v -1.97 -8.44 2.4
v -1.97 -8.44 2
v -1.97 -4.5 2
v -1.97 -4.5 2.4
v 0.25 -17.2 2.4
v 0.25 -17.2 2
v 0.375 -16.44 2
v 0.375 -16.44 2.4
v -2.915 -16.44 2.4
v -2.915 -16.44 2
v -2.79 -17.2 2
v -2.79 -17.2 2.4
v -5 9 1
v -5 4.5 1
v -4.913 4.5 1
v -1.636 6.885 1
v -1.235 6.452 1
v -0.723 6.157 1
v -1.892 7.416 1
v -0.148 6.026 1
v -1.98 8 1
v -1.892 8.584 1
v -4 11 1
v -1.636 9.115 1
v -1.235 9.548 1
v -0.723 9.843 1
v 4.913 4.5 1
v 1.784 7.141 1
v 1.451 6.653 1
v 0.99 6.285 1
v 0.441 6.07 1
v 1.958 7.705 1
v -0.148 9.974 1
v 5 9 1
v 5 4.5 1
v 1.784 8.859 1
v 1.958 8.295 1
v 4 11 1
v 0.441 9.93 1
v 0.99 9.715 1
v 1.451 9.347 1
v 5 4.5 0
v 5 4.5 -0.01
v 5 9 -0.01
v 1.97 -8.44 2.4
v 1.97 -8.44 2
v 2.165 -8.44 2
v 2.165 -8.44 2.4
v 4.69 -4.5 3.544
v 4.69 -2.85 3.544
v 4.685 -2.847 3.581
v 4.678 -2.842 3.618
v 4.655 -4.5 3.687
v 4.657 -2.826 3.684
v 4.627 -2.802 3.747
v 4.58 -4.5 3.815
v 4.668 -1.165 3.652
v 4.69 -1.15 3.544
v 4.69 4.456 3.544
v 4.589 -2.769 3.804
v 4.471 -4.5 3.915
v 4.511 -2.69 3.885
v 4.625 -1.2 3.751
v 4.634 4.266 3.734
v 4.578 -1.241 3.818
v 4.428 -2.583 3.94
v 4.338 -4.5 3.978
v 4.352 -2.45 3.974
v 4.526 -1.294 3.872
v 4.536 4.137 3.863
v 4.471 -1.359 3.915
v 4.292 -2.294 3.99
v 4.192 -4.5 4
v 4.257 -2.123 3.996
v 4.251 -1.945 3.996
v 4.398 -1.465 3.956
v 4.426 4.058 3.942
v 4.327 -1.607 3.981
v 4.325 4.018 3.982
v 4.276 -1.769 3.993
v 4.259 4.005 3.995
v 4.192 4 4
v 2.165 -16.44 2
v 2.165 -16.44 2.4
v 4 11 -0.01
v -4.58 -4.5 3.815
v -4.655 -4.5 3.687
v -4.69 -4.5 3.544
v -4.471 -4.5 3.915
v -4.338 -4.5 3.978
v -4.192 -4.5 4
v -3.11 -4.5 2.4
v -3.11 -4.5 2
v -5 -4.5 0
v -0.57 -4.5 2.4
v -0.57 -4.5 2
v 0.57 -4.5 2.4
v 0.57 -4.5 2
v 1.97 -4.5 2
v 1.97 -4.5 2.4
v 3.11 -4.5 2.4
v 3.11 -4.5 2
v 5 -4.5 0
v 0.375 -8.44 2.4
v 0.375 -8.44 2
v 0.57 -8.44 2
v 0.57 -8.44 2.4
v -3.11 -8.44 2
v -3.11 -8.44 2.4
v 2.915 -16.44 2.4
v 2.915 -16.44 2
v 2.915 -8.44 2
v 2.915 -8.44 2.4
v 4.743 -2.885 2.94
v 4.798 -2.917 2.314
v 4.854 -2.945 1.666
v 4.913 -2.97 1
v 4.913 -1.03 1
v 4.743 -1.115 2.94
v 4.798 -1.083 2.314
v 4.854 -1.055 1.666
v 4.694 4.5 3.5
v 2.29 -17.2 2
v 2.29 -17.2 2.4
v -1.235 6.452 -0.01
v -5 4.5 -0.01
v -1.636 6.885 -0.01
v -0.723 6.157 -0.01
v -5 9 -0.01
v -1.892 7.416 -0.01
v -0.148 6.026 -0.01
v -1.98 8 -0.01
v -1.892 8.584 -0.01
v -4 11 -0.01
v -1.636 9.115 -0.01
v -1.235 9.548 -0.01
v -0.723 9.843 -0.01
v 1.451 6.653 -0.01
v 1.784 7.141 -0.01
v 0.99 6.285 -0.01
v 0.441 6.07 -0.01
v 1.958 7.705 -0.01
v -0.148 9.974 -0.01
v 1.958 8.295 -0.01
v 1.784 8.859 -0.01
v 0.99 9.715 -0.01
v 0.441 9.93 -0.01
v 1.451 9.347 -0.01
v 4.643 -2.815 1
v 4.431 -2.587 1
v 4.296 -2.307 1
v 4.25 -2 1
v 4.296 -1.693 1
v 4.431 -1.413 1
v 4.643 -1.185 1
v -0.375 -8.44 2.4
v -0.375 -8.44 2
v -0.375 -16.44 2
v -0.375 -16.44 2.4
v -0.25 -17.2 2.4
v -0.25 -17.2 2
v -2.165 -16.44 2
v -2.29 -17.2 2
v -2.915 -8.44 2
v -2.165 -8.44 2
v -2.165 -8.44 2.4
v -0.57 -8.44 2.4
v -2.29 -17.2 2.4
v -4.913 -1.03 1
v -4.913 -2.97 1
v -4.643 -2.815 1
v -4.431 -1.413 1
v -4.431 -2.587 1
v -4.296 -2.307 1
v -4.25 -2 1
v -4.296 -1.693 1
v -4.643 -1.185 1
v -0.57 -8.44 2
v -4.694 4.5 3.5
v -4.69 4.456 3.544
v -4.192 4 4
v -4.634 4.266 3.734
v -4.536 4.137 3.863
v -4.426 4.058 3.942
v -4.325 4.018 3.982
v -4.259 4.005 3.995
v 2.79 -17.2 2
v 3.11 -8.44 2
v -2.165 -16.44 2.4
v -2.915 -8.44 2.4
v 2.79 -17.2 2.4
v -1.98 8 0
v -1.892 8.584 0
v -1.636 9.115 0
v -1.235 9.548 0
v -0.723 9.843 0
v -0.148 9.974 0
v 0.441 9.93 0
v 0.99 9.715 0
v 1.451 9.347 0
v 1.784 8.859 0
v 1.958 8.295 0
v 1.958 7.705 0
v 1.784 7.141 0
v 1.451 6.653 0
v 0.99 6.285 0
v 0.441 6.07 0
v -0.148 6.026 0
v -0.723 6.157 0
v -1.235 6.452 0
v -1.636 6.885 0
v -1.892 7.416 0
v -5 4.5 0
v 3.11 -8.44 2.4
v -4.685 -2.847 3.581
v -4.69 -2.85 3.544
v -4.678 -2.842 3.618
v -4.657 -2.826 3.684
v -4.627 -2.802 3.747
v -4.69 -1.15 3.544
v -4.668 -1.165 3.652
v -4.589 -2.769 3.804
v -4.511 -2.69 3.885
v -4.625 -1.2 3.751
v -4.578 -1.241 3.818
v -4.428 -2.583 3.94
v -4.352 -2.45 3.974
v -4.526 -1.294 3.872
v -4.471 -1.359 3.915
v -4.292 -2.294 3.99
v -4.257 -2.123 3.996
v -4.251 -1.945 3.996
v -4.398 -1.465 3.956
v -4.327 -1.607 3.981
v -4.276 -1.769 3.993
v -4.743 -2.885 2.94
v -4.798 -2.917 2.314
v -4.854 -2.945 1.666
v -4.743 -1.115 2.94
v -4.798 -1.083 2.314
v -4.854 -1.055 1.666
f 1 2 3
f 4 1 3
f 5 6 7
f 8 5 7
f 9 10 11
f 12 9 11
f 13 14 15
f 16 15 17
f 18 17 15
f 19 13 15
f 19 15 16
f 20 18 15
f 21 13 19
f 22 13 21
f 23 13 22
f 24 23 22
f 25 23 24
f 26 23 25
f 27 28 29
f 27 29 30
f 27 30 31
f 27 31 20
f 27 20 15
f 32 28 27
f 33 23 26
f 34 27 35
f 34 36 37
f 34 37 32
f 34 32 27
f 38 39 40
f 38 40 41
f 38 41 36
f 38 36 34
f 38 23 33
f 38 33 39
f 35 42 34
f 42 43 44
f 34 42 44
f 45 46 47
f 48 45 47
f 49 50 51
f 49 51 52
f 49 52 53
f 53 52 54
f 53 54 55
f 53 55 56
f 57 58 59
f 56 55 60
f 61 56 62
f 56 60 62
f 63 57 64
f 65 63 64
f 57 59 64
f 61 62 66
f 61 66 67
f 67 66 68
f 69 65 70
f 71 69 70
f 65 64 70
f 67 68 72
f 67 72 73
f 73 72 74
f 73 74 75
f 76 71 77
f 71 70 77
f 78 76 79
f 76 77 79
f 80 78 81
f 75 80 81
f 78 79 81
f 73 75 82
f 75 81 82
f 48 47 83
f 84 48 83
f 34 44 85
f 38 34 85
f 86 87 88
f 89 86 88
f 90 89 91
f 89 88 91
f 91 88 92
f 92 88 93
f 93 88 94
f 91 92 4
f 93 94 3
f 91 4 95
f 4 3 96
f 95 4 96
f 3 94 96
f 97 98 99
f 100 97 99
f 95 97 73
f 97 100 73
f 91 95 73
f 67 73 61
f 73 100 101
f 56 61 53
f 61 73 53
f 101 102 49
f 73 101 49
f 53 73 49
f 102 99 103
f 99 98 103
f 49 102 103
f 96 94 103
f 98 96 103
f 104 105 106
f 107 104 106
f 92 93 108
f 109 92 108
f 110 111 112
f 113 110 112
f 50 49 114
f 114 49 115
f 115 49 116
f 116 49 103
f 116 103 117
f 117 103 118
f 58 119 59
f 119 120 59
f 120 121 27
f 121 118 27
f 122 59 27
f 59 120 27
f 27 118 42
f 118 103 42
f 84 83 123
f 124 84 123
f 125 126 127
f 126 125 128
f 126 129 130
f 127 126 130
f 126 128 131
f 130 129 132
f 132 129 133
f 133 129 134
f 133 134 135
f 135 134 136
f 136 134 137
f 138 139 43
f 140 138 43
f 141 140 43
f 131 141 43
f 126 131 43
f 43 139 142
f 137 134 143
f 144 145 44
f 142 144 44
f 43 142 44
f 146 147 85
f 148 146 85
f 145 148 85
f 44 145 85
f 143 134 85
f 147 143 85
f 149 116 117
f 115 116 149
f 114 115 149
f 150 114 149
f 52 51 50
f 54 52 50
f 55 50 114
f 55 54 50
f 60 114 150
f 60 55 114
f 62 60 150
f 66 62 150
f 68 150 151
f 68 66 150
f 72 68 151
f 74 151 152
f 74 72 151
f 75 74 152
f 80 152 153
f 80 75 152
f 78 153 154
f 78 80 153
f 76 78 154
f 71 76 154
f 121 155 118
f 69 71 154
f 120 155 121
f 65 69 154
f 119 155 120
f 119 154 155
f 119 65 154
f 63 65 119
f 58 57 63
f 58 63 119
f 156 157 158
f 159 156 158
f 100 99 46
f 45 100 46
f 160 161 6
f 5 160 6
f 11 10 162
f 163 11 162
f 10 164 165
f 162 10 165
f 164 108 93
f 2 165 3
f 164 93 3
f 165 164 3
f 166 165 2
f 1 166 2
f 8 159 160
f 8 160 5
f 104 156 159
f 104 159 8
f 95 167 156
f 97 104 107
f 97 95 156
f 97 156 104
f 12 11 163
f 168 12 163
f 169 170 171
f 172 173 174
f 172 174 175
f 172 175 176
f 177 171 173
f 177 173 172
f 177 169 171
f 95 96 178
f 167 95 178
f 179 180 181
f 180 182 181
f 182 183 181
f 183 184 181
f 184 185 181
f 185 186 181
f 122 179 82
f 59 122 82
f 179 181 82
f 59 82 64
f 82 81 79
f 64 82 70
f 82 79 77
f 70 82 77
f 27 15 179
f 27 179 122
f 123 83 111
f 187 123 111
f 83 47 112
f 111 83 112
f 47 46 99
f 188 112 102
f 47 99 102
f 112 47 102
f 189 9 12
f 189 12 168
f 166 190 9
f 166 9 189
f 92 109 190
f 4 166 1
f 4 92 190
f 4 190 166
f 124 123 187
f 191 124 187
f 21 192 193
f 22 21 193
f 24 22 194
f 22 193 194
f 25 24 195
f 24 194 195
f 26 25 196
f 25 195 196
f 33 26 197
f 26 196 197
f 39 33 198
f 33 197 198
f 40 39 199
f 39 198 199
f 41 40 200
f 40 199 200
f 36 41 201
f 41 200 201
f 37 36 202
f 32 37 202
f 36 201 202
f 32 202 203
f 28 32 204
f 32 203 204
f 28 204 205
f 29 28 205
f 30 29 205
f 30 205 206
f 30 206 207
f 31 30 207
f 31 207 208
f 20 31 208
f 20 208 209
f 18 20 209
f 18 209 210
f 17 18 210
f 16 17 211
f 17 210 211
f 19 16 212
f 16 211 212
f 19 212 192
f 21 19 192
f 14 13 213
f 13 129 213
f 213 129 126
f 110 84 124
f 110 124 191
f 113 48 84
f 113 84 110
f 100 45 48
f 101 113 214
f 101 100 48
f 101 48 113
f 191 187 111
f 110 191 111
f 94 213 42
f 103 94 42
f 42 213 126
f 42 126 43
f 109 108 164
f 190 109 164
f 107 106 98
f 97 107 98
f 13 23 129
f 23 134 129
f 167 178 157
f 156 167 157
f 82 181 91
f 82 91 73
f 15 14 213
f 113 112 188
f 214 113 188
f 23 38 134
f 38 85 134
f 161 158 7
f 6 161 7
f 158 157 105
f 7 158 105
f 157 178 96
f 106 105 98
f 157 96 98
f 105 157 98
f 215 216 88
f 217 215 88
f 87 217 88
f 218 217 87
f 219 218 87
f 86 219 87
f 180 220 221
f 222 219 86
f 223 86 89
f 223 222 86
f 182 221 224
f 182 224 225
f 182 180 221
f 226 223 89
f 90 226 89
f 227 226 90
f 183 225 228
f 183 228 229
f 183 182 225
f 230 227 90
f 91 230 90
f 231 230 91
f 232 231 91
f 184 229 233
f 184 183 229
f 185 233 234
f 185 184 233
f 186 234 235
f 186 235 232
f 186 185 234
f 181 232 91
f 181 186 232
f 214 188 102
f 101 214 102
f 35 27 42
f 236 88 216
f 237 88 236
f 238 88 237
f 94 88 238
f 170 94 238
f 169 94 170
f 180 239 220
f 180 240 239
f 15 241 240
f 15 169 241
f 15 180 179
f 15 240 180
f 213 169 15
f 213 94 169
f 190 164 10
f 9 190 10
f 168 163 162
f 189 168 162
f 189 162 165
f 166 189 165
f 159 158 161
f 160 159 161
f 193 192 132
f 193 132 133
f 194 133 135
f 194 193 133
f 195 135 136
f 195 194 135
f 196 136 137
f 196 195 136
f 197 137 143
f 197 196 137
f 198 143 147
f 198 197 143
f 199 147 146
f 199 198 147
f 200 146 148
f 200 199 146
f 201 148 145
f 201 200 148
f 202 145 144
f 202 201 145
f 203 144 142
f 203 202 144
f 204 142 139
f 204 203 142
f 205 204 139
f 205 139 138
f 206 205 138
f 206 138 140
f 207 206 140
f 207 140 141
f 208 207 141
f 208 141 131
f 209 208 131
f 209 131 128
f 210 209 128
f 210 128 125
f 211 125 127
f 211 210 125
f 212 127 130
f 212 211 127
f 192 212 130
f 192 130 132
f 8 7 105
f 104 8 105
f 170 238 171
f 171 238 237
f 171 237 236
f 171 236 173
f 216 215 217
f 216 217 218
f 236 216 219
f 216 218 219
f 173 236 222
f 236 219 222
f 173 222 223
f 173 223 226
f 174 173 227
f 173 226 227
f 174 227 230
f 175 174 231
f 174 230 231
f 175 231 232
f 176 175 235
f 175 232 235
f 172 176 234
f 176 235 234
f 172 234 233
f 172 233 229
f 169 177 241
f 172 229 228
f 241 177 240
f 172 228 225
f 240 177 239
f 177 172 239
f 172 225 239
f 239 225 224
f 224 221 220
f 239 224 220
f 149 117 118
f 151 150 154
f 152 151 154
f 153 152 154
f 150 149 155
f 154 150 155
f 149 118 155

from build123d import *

# Parameters (mm, degrees)
SKETCH2_W                = 10
SKETCH2_H                = 9
BOSS_EXTRUDE1_DEPTH      = 4
CHAMFER1_SIZE            = 0.5
CUT_EXTRUDE1_DEPTH       = 3
BOSS_EXTRUDE2_DEPTH      = 0.4
LPATTERN1_COUNT          = 2
LPATTERN1_PITCH          = 2.54
LPATTERN2_COUNT          = 2
LPATTERN2_PITCH          = 2.54
DRAFT2_ANGLE             = -5
SKETCH8_R                = 1.98
BOSS_EXTRUDE3_DEPTH      = 0.01
BOSS_EXTRUDE3_DEPTH_BACK = 1
FILLET1_R                = 0.5


with BuildPart() as part:
    # Sketch2 → Boss-Extrude1 (new body)
    with BuildSketch(Plane.XY):
        Rectangle(SKETCH2_W, SKETCH2_H)
    extrude(amount=BOSS_EXTRUDE1_DEPTH)

    # Chamfer1
    chamfer1_edges = [part.edges().sort_by_distance(p)[0] for p in [
        (0, 4.5, 4),
    ]]
    chamfer(chamfer1_edges, length=CHAMFER1_SIZE)

    # Sketch6 → Cut-Extrude1 (cut)
    with BuildSketch(Plane.XY.offset(4)):
        with BuildLine():
            Line((5, -1), (5, -3))
            ThreePointArc((5, -3), (4.25, -2), (5, -1))
        make_face()
    cut_extrude1 = extrude(amount=-CUT_EXTRUDE1_DEPTH, mode=Mode.SUBTRACT)

    # Mirror1: Cut-Extrude1 across plane
    add(cut_extrude1.mirror(Plane(origin=(0, 0, 0), x_dir=(0, 0, 1), z_dir=(1, 0, 0))), mode=Mode.SUBTRACT)

    # Sketch7 → Boss-Extrude2 (add)
    with BuildSketch(Plane.XY.offset(2)):
        Polygon((-0.57, -4.5), (-0.57, -8.44), (-0.375, -8.44), (-0.375, -16.44), (-0.25, -17.2), (0.25, -17.2), (0.375, -16.44), (0.375, -8.44), (0.57, -8.44), (0.57, -4.5), align=None)
    boss_extrude2 = extrude(amount=BOSS_EXTRUDE2_DEPTH)

    # LPattern1: Boss-Extrude2 ×2
    with Locations(*[(-i * LPATTERN1_PITCH, 0, 0) for i in range(1, LPATTERN1_COUNT)]):
        add(boss_extrude2)

    # LPattern2: Boss-Extrude2 ×2
    with Locations(*[(i * LPATTERN2_PITCH, 0, 0) for i in range(1, LPATTERN2_COUNT)]):
        add(boss_extrude2)

    # Draft2
    draft2_faces = [part.faces().sort_by_distance(p)[0] for p in [
        (5, 0.383542538, 1.891910739),
        (-5, 0.383542538, 1.891910739),
    ]]
    draft(draft2_faces, Plane(origin=(0, 0, 0), x_dir=(-1, 0, 0), z_dir=(0, 0, -1)), DRAFT2_ANGLE)

    # Sketch8 → Boss-Extrude3 (add, two sides)
    with BuildSketch(Plane(origin=(0, 0, 0), x_dir=(-1, 0, 0), z_dir=(0, 0, -1))) as boss_extrude3_sk:
        Polygon((-5, 9), (-4, 11), (4, 11), (5, 9), (5, 4.5), (-5, 4.5), align=None)
        with Locations((0, 8)):
            Circle(SKETCH8_R, mode=Mode.SUBTRACT)
    extrude(amount=BOSS_EXTRUDE3_DEPTH)
    extrude(boss_extrude3_sk.sketch, amount=-BOSS_EXTRUDE3_DEPTH_BACK)

    # Fillet1
    fillet1_edges = [part.edges().sort_by_distance(p)[0] for p in [
        (-4.650045346, 1.410302183, 4),
        (4.650045346, 1.410302183, 4),
    ]]
    fillet(fillet1_edges, radius=FILLET1_R)


solid = part.part
